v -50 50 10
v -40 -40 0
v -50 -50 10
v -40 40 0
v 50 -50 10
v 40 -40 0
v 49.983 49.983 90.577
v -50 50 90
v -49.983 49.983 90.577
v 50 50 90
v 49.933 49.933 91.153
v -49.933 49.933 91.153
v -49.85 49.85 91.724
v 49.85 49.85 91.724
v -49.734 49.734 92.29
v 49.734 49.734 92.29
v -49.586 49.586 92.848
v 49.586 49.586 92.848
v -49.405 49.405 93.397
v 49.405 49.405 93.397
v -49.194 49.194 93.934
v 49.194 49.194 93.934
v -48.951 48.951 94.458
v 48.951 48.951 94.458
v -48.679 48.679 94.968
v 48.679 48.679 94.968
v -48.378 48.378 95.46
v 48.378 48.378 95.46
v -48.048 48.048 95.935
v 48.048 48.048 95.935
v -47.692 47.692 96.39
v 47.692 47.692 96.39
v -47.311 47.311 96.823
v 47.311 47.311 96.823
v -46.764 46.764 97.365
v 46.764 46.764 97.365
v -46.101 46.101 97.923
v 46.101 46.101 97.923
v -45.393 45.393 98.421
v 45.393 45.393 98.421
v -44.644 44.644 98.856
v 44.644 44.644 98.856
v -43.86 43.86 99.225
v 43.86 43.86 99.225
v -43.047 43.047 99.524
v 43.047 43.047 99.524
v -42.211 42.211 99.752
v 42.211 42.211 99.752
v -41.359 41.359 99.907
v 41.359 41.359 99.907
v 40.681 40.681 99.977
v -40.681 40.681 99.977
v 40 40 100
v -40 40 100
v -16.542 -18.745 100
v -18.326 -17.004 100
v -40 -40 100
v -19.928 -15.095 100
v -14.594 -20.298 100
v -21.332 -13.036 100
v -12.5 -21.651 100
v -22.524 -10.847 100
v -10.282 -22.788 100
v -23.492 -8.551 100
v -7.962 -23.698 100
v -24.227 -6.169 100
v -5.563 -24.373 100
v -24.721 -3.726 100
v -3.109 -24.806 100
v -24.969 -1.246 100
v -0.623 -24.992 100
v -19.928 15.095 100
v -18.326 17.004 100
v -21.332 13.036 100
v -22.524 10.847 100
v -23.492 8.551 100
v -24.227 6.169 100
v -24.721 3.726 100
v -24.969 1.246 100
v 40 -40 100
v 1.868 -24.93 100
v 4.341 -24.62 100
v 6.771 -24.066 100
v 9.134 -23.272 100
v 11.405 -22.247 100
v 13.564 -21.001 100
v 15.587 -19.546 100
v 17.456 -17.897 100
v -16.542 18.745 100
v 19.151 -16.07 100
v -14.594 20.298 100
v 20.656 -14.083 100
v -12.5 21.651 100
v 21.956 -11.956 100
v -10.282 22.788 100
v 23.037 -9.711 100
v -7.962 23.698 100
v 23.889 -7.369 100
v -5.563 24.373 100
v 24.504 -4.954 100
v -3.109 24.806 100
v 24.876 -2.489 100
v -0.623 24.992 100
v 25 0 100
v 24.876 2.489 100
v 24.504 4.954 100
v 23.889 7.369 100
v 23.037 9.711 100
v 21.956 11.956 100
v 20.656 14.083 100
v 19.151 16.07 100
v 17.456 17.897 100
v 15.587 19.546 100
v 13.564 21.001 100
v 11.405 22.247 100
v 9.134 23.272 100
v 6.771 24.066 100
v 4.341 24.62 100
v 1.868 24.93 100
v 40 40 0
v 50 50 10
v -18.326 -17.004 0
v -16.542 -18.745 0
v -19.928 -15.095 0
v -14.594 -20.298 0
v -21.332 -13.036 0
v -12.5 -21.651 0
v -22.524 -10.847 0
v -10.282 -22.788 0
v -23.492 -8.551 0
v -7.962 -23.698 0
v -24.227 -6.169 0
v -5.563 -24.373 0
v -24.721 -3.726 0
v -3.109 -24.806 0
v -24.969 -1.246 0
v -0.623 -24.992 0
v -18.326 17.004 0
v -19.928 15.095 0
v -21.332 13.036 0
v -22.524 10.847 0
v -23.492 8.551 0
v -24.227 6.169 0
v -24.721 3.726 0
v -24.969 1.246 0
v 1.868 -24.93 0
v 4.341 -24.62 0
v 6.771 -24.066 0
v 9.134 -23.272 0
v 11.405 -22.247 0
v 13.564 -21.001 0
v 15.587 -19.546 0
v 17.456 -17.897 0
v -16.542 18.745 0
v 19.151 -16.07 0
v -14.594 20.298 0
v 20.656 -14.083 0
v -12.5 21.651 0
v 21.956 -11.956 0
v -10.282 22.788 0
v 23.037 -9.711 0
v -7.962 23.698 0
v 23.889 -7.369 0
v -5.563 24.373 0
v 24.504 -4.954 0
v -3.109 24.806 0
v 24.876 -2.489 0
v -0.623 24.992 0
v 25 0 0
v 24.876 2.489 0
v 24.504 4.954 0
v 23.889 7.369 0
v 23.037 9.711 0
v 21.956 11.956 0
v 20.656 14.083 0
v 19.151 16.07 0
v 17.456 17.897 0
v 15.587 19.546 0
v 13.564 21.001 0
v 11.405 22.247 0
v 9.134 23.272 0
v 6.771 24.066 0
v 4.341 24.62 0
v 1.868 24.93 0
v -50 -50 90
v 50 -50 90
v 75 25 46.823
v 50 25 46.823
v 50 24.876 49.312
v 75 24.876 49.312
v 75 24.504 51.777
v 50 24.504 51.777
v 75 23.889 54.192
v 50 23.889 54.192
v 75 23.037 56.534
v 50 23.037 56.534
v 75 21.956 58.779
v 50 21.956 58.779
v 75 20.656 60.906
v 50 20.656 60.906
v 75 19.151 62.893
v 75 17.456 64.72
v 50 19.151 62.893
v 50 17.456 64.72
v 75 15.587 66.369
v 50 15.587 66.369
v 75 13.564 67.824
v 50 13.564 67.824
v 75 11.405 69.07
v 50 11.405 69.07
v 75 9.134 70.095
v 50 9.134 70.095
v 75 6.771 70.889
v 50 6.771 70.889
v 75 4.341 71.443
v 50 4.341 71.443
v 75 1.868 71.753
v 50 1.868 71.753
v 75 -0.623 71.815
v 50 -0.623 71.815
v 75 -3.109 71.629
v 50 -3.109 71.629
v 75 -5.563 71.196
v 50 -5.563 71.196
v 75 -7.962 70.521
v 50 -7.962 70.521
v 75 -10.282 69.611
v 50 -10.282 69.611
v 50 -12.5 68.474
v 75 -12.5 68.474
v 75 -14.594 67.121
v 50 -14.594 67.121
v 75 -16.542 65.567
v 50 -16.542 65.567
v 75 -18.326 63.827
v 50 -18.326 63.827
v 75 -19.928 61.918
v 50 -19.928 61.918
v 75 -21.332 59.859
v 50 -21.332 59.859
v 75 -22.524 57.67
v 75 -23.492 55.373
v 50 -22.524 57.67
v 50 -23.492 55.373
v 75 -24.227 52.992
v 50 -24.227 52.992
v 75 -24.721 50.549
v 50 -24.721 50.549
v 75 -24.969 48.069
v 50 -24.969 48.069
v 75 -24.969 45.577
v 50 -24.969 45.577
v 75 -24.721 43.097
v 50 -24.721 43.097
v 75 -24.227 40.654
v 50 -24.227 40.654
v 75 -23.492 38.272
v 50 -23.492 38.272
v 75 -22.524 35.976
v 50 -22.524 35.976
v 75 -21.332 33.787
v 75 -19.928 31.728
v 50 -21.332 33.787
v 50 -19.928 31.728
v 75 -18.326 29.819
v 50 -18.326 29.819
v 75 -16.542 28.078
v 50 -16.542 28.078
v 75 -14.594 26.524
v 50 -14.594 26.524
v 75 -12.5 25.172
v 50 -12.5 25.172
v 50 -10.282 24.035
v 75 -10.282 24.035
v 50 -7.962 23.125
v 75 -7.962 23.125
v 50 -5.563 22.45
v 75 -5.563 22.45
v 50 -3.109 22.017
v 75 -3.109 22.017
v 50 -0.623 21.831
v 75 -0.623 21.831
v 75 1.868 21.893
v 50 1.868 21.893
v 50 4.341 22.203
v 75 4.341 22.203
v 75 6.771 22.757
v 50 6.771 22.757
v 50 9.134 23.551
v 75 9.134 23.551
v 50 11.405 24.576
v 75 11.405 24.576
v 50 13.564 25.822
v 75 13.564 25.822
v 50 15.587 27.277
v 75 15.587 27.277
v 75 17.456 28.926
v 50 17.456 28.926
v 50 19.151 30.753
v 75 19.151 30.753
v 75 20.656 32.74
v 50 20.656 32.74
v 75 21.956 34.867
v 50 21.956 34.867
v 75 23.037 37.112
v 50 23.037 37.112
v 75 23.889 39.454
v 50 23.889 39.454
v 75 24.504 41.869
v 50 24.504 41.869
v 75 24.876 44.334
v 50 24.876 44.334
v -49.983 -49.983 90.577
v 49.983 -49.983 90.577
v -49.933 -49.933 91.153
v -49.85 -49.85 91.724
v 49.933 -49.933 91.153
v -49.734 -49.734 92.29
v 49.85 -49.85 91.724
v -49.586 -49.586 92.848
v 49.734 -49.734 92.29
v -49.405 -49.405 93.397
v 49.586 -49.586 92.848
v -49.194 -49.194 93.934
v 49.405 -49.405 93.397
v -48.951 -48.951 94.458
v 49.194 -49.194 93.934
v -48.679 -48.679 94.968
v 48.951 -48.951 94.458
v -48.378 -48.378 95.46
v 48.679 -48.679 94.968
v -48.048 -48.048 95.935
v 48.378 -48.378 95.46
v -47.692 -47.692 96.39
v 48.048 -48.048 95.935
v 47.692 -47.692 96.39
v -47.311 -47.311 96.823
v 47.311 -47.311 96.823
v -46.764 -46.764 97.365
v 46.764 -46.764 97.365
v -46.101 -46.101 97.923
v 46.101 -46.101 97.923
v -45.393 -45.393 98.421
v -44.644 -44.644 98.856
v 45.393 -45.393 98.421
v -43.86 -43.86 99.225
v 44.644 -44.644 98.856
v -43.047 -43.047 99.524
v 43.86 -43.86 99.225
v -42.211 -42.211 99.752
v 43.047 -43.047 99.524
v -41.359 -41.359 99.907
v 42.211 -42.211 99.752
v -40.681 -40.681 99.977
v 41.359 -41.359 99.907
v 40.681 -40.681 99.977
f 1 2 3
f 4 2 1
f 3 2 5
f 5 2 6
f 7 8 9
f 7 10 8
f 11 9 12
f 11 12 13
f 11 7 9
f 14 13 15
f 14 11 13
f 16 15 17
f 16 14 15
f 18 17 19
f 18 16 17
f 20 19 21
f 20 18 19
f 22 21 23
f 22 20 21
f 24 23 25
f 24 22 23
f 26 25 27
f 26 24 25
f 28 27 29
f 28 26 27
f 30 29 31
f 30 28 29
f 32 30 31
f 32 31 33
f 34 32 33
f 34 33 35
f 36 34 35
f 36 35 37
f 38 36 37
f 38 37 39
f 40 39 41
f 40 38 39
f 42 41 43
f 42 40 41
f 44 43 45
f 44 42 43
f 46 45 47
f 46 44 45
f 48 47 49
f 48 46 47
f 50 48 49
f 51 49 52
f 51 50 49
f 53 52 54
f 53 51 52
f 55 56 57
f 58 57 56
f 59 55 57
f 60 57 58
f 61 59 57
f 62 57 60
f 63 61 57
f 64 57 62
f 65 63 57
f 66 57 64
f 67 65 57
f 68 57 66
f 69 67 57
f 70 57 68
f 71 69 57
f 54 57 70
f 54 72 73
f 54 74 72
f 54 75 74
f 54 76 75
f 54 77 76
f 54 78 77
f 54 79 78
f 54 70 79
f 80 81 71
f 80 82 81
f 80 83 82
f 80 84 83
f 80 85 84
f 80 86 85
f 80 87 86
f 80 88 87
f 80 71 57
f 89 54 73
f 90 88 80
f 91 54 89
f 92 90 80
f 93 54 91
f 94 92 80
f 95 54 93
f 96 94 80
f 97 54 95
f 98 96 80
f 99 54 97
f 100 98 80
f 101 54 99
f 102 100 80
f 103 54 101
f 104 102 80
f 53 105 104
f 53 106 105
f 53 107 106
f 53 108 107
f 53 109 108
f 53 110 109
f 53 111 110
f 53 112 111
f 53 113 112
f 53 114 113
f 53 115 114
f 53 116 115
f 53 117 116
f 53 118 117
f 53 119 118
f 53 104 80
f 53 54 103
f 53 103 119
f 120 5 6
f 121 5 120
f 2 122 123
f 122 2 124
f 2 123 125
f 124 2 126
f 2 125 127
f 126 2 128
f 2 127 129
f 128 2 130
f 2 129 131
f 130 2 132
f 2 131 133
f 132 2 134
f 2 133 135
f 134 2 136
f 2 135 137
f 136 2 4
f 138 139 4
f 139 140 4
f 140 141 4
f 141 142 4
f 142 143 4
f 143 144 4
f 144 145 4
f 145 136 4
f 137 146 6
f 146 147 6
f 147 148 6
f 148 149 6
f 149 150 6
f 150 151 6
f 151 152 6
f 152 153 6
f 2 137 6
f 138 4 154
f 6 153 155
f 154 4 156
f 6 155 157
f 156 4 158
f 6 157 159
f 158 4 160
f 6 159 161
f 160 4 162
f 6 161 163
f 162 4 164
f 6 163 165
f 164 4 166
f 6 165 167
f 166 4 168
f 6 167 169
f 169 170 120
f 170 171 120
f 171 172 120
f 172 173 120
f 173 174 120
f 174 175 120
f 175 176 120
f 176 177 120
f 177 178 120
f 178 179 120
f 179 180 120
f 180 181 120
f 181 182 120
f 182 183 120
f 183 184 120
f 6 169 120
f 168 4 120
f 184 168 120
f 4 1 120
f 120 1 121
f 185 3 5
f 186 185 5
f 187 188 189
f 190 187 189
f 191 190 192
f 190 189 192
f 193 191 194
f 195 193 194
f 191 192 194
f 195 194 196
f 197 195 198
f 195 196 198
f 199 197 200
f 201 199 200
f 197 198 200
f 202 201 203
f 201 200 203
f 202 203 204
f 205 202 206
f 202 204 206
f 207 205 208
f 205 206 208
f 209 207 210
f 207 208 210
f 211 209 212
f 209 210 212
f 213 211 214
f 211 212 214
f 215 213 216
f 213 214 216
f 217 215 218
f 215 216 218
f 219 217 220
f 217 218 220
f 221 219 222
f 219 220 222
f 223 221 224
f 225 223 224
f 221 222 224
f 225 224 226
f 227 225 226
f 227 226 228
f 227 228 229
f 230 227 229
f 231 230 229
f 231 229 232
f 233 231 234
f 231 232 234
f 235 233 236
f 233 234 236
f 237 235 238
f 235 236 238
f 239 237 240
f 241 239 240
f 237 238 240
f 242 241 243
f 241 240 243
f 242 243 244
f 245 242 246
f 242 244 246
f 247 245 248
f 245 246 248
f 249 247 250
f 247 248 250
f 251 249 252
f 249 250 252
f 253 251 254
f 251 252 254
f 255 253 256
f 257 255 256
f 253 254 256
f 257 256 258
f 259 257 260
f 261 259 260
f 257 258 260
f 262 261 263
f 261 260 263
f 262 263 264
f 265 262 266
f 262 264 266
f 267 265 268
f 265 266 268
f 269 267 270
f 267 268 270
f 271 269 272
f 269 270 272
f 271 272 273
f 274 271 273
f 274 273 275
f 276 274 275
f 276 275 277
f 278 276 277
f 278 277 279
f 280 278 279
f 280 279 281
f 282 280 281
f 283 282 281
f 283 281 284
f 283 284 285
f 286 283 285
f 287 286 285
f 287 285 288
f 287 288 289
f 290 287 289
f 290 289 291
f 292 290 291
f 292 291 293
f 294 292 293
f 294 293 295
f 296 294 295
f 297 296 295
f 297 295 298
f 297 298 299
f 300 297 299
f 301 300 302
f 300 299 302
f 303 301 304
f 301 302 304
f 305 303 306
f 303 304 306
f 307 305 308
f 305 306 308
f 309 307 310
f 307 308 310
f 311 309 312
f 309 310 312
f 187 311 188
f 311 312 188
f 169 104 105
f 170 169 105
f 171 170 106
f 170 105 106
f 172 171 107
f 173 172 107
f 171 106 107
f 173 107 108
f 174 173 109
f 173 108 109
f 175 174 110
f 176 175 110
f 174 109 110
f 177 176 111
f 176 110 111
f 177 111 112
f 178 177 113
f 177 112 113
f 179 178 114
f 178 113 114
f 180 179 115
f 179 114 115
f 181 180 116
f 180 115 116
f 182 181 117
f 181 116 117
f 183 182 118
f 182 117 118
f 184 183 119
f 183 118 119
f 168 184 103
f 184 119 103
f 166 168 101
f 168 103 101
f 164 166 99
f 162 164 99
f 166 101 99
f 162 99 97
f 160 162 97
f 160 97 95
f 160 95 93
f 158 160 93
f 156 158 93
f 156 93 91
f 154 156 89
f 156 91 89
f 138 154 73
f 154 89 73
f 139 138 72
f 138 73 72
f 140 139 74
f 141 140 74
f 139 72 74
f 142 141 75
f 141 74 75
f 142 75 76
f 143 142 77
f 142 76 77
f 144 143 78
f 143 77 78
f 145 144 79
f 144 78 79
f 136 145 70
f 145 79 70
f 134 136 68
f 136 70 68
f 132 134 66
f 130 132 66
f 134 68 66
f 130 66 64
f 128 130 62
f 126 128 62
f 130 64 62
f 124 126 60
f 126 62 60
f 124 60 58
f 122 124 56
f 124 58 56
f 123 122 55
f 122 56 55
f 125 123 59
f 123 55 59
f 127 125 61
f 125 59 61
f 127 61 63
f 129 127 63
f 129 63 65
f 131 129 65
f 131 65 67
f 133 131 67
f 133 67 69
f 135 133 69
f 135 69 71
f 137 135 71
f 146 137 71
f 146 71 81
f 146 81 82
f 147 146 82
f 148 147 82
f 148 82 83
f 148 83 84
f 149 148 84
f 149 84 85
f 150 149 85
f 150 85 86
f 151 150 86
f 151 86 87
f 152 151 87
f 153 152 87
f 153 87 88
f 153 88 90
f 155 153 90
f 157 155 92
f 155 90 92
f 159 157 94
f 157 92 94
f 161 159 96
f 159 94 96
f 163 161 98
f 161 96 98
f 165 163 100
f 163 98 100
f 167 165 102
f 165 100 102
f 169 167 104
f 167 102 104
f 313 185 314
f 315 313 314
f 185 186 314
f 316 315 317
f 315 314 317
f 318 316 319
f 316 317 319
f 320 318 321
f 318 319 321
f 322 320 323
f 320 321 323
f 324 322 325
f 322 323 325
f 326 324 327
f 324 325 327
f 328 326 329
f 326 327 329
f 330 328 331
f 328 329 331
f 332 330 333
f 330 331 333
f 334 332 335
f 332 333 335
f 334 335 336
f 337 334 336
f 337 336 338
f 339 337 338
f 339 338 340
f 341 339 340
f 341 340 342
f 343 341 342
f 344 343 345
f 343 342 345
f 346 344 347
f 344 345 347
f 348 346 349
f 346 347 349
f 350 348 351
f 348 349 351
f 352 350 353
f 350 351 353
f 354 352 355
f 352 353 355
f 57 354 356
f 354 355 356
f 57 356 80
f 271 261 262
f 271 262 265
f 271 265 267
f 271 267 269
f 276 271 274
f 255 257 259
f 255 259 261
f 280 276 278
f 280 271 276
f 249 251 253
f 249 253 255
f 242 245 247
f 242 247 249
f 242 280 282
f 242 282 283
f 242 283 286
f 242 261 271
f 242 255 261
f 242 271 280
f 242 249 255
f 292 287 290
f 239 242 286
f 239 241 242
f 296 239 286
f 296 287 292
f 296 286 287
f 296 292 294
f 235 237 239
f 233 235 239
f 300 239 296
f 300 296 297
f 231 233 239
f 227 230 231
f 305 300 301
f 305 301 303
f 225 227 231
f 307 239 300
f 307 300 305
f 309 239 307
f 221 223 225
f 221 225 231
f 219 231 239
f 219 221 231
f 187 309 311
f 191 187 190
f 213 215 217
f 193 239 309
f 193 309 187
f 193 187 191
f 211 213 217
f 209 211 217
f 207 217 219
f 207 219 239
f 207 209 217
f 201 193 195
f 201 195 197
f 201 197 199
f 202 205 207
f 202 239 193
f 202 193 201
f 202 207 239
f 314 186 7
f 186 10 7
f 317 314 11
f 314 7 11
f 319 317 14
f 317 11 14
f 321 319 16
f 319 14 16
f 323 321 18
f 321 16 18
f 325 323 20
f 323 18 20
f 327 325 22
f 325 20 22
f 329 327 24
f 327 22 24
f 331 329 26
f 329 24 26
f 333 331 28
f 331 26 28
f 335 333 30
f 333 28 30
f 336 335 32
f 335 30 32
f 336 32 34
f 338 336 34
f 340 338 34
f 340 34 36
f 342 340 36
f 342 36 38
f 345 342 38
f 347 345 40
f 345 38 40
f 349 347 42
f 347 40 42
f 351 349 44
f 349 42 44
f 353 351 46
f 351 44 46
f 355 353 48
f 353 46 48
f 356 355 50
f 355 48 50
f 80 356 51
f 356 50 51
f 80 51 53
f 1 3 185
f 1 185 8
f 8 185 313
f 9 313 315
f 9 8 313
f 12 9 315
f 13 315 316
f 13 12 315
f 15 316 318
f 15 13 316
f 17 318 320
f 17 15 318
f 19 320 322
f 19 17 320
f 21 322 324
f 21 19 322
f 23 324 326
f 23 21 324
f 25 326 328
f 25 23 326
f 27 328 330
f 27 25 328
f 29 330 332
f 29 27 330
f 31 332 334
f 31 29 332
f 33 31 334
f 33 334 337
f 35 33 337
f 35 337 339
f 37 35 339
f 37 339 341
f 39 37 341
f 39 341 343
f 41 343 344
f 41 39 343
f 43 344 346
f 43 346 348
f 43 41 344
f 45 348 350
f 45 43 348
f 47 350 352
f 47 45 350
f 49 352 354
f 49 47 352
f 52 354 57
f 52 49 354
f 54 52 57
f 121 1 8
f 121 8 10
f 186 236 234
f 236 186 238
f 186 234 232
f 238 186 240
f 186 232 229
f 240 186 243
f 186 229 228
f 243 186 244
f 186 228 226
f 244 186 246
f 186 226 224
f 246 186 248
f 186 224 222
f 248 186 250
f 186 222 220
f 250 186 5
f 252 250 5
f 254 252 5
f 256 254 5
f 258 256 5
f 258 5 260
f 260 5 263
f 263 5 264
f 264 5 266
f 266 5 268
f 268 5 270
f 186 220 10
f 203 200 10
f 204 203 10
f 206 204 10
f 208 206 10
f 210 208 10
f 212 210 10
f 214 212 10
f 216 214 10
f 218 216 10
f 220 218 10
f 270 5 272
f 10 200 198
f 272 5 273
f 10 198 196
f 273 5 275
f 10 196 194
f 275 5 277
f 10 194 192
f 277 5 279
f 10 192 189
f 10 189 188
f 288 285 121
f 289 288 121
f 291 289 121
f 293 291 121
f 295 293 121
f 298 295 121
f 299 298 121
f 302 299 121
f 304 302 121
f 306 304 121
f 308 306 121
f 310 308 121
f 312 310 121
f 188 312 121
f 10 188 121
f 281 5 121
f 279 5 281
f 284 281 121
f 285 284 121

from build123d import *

# Parameters (mm, degrees)
F0_W     = 100
F0_H     = 100
F1_DEPTH = 100
F2_R     = 10
F3_SIZE  = 10
F4_R     = 25
F5_DEPTH = 100
F6_R     = 25
F7_DEPTH = 25


with BuildPart() as f1:
    # F0 (on Top) → F1 (new body)
    with BuildSketch(Plane.XY):
        Rectangle(F0_W, F0_H)
    extrude(amount=F1_DEPTH)

    # F2
    f2_edges = [f1.edges().sort_by_distance(p)[0] for p in [
        (-50, 0, 100),
        (0, -50, 100),
        (50, 0, 100),
        (0, 50, 100),
    ]]
    fillet(f2_edges, radius=F2_R)

    # F3
    f3_edges = [f1.edges().sort_by_distance(p)[0] for p in [
        (0, -50, 0),
        (50, 0, 0),
        (0, 50, 0),
        (-50, 0, 0),
    ]]
    chamfer(f3_edges, length=F3_SIZE)

    # F4 (on face) → F5 (cut)
    with BuildSketch(Plane.XY.offset(100)):
        Circle(F4_R)
    extrude(amount=-F5_DEPTH, mode=Mode.SUBTRACT)

    # F6 (on face) → F7 (join)
    with BuildSketch(Plane.YZ.offset(50)):
        with Locations((0, 46.822905)):
            Circle(F6_R)
    extrude(amount=F7_DEPTH)


solid = f1.part
